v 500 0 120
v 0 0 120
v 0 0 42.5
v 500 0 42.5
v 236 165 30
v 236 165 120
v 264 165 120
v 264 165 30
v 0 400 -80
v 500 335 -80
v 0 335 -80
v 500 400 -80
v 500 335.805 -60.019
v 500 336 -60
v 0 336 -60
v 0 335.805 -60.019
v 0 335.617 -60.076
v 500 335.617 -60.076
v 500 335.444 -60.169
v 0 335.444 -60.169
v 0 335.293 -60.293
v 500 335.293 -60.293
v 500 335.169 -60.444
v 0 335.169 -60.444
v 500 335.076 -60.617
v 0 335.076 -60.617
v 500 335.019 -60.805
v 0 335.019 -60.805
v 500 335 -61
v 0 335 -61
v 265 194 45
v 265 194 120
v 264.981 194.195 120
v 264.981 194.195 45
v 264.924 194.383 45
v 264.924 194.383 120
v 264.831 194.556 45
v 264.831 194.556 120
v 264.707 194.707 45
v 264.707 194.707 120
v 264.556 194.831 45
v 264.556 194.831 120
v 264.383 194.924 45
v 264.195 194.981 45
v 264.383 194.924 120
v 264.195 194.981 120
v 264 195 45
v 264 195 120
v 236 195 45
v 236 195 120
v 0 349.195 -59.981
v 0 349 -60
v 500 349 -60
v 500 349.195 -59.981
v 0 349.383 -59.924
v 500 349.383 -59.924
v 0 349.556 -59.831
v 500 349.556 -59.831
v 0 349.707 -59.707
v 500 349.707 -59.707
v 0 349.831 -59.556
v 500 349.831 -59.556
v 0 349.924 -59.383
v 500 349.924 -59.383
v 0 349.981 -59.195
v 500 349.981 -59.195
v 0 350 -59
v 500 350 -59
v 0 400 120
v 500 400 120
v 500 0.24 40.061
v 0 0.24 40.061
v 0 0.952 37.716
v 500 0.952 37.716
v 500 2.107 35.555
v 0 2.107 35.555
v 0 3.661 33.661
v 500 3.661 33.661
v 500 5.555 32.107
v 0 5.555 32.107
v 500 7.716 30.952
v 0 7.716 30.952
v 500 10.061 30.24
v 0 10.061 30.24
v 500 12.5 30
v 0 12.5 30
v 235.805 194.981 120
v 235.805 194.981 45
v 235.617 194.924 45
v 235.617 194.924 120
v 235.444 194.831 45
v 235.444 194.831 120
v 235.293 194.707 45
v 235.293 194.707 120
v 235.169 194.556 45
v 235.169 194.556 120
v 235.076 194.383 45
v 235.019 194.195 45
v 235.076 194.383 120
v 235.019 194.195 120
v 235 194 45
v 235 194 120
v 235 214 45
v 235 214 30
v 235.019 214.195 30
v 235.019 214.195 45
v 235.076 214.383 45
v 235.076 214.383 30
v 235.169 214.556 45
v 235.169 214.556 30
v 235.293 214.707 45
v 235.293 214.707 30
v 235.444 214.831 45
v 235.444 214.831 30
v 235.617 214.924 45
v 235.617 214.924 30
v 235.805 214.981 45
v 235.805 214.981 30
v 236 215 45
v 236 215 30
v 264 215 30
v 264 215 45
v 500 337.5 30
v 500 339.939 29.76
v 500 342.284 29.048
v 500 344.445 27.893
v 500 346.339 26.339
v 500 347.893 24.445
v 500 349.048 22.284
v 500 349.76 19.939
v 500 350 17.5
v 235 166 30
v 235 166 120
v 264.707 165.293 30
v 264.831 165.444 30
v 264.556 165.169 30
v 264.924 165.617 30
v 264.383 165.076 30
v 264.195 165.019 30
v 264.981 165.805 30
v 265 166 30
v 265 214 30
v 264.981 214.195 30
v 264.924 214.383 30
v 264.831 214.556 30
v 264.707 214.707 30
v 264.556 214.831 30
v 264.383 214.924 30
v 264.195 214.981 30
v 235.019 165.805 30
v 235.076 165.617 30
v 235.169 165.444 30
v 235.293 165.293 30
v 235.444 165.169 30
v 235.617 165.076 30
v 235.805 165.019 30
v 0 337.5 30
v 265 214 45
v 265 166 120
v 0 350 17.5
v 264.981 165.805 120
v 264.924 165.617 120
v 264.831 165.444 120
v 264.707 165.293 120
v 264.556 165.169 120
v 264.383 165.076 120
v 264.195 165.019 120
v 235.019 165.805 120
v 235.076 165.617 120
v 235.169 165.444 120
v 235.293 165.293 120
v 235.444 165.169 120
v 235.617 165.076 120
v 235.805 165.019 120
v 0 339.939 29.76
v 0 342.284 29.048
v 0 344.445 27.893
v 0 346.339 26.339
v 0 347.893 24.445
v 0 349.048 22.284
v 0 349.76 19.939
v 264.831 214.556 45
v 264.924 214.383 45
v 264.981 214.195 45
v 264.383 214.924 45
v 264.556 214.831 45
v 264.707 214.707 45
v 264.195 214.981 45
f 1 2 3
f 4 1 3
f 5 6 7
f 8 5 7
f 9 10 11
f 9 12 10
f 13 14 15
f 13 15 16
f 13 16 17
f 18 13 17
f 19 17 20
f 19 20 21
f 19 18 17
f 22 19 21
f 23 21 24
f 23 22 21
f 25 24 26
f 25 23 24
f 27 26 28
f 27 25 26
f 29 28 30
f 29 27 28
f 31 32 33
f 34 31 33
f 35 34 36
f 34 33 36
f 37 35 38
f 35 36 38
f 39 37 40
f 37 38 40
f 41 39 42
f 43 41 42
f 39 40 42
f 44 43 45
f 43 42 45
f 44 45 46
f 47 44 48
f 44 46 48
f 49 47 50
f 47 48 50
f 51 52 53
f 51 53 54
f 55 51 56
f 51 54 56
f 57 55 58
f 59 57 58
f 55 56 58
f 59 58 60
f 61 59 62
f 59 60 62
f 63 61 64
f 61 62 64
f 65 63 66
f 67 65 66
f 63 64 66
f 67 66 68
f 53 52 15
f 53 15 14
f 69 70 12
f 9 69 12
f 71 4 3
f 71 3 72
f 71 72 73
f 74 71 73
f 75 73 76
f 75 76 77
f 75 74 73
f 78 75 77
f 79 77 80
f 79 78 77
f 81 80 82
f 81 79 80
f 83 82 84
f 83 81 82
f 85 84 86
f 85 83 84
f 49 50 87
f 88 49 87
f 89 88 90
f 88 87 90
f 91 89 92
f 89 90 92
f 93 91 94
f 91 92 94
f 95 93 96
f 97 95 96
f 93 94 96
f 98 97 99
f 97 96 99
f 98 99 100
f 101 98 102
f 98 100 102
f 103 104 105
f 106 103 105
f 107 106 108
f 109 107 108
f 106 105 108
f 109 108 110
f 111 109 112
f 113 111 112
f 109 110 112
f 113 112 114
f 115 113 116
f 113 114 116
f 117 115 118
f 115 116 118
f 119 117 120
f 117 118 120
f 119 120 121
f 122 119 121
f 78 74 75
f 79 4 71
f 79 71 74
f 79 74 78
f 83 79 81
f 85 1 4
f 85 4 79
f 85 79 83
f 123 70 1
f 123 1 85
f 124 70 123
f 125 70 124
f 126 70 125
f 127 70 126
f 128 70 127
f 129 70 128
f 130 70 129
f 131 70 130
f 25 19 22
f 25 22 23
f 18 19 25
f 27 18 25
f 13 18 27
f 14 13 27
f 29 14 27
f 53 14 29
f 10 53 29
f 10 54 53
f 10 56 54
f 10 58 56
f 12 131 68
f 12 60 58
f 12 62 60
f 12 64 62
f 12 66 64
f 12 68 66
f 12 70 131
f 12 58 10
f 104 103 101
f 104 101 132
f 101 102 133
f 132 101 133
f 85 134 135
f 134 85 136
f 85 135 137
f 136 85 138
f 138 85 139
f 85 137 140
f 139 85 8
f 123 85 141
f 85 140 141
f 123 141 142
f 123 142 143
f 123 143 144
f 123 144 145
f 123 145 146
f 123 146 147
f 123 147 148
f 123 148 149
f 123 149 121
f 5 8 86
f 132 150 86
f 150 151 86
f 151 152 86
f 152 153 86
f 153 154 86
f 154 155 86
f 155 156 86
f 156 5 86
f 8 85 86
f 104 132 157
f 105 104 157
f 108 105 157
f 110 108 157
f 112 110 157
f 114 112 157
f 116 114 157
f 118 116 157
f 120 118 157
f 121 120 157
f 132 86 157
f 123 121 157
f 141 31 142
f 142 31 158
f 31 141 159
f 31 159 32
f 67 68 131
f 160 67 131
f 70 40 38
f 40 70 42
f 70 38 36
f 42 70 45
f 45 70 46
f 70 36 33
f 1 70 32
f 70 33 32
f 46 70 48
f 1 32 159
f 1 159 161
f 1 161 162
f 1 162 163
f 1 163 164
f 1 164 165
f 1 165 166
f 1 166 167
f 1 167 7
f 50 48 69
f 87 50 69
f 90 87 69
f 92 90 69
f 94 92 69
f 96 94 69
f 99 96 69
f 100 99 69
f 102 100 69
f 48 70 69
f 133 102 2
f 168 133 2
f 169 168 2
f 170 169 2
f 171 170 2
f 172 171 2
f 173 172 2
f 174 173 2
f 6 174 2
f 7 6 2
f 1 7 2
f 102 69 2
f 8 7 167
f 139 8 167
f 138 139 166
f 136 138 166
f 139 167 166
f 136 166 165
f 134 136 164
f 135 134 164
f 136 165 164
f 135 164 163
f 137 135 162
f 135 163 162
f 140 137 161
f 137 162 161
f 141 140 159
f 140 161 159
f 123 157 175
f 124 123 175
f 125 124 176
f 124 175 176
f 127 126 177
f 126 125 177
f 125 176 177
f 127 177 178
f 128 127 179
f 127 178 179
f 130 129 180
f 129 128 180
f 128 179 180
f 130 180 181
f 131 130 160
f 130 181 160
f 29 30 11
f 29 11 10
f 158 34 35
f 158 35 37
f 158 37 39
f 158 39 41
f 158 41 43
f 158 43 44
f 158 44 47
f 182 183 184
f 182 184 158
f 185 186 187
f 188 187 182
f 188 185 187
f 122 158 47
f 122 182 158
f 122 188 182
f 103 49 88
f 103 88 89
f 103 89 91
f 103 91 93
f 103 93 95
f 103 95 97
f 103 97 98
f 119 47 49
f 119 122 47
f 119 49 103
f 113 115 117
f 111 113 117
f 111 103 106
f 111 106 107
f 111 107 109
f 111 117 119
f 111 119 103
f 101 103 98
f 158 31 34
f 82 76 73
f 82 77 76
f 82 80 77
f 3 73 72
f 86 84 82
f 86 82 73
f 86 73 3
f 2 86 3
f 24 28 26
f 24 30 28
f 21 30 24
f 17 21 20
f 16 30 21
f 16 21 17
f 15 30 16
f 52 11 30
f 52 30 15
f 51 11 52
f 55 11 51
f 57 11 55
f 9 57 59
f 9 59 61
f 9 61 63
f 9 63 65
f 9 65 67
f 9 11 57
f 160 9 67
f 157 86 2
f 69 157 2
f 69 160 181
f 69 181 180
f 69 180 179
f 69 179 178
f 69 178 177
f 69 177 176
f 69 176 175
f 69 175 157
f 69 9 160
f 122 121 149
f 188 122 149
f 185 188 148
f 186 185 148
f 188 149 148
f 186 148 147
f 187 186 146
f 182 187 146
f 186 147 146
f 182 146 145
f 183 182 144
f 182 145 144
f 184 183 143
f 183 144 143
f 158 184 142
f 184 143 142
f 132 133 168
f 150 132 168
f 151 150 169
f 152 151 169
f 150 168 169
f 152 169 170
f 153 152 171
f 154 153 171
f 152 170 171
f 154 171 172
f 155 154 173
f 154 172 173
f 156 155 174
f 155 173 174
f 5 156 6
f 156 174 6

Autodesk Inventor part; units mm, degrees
ref_plane "YZ Plane" through (0, 0, 0) normal (1, 0, 0) x (0, 1, 0)
ref_plane "XZ Plane" through (0, 0, 0) normal (0, 1, 0) x (-1, 0, 0)
ref_plane "XY Plane" through (0, 0, 0) normal (0, 0, 1) x (1, 0, 0)
sketch "Sketch1" plane through (0, 0, 0) normal (1, 0, 0) x (0, 1, 0)
  line L0 (400, 120) -> (0, 120)
  line L1 (0, 40) -> (0, 62.8571)
  line L2 (400, 120) -> (0, 120)
  line L3 (0, 120) -> (0, 30)
  line L4 (0, 30) -> (400, 30)
  line L5 (400, 30) -> (400, 120)
  dimension "d54" = 400
  dimension "d55" = 90
extrude "Extrusion1" add sketch "Sketch1" along normal blind 500
sketch "Sketch2" plane through (500, 0, 0) normal (1, 0, 0) x (0, 0, -1)
  line L0 (-30, 400) -> (80, 400)
  line L1 (80, 400) -> (80, 350)
  line L2 (80, 350) -> (-30, 350)
  line L3 (-30, 350) -> (-30, 400)
  arc A0 (-42.5, 0) -> (-30, 12.5) centre (-42.5, 12.5) ccw
  line L4 (-120, 0) -> (-30, 0) projected
  line L5 (-30, 0) -> (-64.3382, 0)
  line L6 (-30, 12.5) -> (-30, 0)
  line L7 (-120, 400) -> (-120, 0) projected
  line L8 (-120, 0) -> (-70, 0)
  line L9 (-70, 0) -> (-70, 50)
  line L10 (-70, 50) -> (-120, 50)
  line L11 (-120, 50) -> (-120, 0)
  point P0 (-70, 0)
  dimension "d11" = 110
  dimension "d12" = 50
  dimension "d33" = 12.5
  dimension "d38" = 50
  dimension "d39" = 50
extrude "Extrusion11" cut sketch "Sketch2" against normal blind 500 contours A0 L6 L4
extrude "Extrusion12" add sketch "Sketch2" against normal blind 500 contours L0 L1 L2 L3
sketch "Sketch8" plane through (0, 0, 120) normal (0, 0, 1) x (1, 0, 0)
  line L0 (0, 0) -> (500, 0) projected
  line L1 (0, 400) -> (500, 400) projected
  line L2 (0, 0) -> (500, 0)
  line L3 (500, 0) -> (500, 400)
  line L4 (500, 400) -> (0, 400)
  line L5 (0, 400) -> (0, 0)
  line L6 (264, 195) -> (236, 195)
  line L7 (235, 194) -> (235, 166)
  line L8 (236, 165) -> (264, 165)
  line L9 (265, 166) -> (265, 194)
  arc A0 (236, 195) -> (235, 194) centre (236, 194) ccw
  arc A1 (265, 194) -> (264, 195) centre (264, 194) ccw
  arc A2 (264, 165) -> (265, 166) centre (264, 166) ccw
  arc A3 (235, 166) -> (236, 165) centre (236, 166) ccw
  point P0 (265, 195)
  point P1 (235, 165)
  point P2 (235, 195)
  point P3 (265, 165)
  dimension "d77" = 30
  dimension "d78" = 30
  dimension "d83" = 1
extrude "Extrusion17" cut sketch "Sketch8" against normal blind 90 contours A1 L9 A2 L8 A3 L7 A0 L6
sketch "Sketch10" plane through (500, 12.5, 30) normal (0, 0, -1) x (-1, 0, 0)
  line L0 (236, 152.5) -> (264, 152.5)
  line L1 (265, 153.5) -> (265, 201.5)
  line L2 (264, 202.5) -> (236, 202.5)
  line L3 (235, 201.5) -> (235, 153.5)
  arc A0 (236, 202.5) -> (235, 201.5) centre (236, 201.5) ccw
  arc A1 (265, 201.5) -> (264, 202.5) centre (264, 201.5) ccw
  arc A2 (264, 152.5) -> (265, 153.5) centre (264, 153.5) ccw
  arc A3 (235, 153.5) -> (236, 152.5) centre (236, 153.5) ccw
  point P0 (500, -12.5)
  point P1 (265, 202.5)
  point P2 (265, 152.5)
  point P3 (235, 202.5)
  dimension "d84" = 30
  dimension "d85" = 50
  dimension "d86" = 1
extrude "Extrusion18" cut sketch "Sketch10" against normal blind 15
fillet "Face Fillet1" radius 12.5 1 edges at (250, 350, 30)
sketch "Sketch11" plane through (0, 350, -80) normal (0, -1, 0) x (1, 0, 0)
  line L0 (500, 0) -> (0, 0) projected
  line L1 (500, 0) -> (0, 0)
  line L2 (0, 0) -> (0, 20)
  line L3 (0, 20) -> (500, 20)
  line L4 (500, 20) -> (500, 0)
  dimension "d92" = 500
  dimension "d93" = 20
extrude "Extrusion19" add sketch "Sketch11" along normal blind 15
fillet "Face Fillet2" radius 1 1 edges at (250, 350, -60)
fillet "Face Fillet3" radius 1 1 edges at (250, 335, -60)
properties part number "Molde" material "Aluminum 6061-AHC"
